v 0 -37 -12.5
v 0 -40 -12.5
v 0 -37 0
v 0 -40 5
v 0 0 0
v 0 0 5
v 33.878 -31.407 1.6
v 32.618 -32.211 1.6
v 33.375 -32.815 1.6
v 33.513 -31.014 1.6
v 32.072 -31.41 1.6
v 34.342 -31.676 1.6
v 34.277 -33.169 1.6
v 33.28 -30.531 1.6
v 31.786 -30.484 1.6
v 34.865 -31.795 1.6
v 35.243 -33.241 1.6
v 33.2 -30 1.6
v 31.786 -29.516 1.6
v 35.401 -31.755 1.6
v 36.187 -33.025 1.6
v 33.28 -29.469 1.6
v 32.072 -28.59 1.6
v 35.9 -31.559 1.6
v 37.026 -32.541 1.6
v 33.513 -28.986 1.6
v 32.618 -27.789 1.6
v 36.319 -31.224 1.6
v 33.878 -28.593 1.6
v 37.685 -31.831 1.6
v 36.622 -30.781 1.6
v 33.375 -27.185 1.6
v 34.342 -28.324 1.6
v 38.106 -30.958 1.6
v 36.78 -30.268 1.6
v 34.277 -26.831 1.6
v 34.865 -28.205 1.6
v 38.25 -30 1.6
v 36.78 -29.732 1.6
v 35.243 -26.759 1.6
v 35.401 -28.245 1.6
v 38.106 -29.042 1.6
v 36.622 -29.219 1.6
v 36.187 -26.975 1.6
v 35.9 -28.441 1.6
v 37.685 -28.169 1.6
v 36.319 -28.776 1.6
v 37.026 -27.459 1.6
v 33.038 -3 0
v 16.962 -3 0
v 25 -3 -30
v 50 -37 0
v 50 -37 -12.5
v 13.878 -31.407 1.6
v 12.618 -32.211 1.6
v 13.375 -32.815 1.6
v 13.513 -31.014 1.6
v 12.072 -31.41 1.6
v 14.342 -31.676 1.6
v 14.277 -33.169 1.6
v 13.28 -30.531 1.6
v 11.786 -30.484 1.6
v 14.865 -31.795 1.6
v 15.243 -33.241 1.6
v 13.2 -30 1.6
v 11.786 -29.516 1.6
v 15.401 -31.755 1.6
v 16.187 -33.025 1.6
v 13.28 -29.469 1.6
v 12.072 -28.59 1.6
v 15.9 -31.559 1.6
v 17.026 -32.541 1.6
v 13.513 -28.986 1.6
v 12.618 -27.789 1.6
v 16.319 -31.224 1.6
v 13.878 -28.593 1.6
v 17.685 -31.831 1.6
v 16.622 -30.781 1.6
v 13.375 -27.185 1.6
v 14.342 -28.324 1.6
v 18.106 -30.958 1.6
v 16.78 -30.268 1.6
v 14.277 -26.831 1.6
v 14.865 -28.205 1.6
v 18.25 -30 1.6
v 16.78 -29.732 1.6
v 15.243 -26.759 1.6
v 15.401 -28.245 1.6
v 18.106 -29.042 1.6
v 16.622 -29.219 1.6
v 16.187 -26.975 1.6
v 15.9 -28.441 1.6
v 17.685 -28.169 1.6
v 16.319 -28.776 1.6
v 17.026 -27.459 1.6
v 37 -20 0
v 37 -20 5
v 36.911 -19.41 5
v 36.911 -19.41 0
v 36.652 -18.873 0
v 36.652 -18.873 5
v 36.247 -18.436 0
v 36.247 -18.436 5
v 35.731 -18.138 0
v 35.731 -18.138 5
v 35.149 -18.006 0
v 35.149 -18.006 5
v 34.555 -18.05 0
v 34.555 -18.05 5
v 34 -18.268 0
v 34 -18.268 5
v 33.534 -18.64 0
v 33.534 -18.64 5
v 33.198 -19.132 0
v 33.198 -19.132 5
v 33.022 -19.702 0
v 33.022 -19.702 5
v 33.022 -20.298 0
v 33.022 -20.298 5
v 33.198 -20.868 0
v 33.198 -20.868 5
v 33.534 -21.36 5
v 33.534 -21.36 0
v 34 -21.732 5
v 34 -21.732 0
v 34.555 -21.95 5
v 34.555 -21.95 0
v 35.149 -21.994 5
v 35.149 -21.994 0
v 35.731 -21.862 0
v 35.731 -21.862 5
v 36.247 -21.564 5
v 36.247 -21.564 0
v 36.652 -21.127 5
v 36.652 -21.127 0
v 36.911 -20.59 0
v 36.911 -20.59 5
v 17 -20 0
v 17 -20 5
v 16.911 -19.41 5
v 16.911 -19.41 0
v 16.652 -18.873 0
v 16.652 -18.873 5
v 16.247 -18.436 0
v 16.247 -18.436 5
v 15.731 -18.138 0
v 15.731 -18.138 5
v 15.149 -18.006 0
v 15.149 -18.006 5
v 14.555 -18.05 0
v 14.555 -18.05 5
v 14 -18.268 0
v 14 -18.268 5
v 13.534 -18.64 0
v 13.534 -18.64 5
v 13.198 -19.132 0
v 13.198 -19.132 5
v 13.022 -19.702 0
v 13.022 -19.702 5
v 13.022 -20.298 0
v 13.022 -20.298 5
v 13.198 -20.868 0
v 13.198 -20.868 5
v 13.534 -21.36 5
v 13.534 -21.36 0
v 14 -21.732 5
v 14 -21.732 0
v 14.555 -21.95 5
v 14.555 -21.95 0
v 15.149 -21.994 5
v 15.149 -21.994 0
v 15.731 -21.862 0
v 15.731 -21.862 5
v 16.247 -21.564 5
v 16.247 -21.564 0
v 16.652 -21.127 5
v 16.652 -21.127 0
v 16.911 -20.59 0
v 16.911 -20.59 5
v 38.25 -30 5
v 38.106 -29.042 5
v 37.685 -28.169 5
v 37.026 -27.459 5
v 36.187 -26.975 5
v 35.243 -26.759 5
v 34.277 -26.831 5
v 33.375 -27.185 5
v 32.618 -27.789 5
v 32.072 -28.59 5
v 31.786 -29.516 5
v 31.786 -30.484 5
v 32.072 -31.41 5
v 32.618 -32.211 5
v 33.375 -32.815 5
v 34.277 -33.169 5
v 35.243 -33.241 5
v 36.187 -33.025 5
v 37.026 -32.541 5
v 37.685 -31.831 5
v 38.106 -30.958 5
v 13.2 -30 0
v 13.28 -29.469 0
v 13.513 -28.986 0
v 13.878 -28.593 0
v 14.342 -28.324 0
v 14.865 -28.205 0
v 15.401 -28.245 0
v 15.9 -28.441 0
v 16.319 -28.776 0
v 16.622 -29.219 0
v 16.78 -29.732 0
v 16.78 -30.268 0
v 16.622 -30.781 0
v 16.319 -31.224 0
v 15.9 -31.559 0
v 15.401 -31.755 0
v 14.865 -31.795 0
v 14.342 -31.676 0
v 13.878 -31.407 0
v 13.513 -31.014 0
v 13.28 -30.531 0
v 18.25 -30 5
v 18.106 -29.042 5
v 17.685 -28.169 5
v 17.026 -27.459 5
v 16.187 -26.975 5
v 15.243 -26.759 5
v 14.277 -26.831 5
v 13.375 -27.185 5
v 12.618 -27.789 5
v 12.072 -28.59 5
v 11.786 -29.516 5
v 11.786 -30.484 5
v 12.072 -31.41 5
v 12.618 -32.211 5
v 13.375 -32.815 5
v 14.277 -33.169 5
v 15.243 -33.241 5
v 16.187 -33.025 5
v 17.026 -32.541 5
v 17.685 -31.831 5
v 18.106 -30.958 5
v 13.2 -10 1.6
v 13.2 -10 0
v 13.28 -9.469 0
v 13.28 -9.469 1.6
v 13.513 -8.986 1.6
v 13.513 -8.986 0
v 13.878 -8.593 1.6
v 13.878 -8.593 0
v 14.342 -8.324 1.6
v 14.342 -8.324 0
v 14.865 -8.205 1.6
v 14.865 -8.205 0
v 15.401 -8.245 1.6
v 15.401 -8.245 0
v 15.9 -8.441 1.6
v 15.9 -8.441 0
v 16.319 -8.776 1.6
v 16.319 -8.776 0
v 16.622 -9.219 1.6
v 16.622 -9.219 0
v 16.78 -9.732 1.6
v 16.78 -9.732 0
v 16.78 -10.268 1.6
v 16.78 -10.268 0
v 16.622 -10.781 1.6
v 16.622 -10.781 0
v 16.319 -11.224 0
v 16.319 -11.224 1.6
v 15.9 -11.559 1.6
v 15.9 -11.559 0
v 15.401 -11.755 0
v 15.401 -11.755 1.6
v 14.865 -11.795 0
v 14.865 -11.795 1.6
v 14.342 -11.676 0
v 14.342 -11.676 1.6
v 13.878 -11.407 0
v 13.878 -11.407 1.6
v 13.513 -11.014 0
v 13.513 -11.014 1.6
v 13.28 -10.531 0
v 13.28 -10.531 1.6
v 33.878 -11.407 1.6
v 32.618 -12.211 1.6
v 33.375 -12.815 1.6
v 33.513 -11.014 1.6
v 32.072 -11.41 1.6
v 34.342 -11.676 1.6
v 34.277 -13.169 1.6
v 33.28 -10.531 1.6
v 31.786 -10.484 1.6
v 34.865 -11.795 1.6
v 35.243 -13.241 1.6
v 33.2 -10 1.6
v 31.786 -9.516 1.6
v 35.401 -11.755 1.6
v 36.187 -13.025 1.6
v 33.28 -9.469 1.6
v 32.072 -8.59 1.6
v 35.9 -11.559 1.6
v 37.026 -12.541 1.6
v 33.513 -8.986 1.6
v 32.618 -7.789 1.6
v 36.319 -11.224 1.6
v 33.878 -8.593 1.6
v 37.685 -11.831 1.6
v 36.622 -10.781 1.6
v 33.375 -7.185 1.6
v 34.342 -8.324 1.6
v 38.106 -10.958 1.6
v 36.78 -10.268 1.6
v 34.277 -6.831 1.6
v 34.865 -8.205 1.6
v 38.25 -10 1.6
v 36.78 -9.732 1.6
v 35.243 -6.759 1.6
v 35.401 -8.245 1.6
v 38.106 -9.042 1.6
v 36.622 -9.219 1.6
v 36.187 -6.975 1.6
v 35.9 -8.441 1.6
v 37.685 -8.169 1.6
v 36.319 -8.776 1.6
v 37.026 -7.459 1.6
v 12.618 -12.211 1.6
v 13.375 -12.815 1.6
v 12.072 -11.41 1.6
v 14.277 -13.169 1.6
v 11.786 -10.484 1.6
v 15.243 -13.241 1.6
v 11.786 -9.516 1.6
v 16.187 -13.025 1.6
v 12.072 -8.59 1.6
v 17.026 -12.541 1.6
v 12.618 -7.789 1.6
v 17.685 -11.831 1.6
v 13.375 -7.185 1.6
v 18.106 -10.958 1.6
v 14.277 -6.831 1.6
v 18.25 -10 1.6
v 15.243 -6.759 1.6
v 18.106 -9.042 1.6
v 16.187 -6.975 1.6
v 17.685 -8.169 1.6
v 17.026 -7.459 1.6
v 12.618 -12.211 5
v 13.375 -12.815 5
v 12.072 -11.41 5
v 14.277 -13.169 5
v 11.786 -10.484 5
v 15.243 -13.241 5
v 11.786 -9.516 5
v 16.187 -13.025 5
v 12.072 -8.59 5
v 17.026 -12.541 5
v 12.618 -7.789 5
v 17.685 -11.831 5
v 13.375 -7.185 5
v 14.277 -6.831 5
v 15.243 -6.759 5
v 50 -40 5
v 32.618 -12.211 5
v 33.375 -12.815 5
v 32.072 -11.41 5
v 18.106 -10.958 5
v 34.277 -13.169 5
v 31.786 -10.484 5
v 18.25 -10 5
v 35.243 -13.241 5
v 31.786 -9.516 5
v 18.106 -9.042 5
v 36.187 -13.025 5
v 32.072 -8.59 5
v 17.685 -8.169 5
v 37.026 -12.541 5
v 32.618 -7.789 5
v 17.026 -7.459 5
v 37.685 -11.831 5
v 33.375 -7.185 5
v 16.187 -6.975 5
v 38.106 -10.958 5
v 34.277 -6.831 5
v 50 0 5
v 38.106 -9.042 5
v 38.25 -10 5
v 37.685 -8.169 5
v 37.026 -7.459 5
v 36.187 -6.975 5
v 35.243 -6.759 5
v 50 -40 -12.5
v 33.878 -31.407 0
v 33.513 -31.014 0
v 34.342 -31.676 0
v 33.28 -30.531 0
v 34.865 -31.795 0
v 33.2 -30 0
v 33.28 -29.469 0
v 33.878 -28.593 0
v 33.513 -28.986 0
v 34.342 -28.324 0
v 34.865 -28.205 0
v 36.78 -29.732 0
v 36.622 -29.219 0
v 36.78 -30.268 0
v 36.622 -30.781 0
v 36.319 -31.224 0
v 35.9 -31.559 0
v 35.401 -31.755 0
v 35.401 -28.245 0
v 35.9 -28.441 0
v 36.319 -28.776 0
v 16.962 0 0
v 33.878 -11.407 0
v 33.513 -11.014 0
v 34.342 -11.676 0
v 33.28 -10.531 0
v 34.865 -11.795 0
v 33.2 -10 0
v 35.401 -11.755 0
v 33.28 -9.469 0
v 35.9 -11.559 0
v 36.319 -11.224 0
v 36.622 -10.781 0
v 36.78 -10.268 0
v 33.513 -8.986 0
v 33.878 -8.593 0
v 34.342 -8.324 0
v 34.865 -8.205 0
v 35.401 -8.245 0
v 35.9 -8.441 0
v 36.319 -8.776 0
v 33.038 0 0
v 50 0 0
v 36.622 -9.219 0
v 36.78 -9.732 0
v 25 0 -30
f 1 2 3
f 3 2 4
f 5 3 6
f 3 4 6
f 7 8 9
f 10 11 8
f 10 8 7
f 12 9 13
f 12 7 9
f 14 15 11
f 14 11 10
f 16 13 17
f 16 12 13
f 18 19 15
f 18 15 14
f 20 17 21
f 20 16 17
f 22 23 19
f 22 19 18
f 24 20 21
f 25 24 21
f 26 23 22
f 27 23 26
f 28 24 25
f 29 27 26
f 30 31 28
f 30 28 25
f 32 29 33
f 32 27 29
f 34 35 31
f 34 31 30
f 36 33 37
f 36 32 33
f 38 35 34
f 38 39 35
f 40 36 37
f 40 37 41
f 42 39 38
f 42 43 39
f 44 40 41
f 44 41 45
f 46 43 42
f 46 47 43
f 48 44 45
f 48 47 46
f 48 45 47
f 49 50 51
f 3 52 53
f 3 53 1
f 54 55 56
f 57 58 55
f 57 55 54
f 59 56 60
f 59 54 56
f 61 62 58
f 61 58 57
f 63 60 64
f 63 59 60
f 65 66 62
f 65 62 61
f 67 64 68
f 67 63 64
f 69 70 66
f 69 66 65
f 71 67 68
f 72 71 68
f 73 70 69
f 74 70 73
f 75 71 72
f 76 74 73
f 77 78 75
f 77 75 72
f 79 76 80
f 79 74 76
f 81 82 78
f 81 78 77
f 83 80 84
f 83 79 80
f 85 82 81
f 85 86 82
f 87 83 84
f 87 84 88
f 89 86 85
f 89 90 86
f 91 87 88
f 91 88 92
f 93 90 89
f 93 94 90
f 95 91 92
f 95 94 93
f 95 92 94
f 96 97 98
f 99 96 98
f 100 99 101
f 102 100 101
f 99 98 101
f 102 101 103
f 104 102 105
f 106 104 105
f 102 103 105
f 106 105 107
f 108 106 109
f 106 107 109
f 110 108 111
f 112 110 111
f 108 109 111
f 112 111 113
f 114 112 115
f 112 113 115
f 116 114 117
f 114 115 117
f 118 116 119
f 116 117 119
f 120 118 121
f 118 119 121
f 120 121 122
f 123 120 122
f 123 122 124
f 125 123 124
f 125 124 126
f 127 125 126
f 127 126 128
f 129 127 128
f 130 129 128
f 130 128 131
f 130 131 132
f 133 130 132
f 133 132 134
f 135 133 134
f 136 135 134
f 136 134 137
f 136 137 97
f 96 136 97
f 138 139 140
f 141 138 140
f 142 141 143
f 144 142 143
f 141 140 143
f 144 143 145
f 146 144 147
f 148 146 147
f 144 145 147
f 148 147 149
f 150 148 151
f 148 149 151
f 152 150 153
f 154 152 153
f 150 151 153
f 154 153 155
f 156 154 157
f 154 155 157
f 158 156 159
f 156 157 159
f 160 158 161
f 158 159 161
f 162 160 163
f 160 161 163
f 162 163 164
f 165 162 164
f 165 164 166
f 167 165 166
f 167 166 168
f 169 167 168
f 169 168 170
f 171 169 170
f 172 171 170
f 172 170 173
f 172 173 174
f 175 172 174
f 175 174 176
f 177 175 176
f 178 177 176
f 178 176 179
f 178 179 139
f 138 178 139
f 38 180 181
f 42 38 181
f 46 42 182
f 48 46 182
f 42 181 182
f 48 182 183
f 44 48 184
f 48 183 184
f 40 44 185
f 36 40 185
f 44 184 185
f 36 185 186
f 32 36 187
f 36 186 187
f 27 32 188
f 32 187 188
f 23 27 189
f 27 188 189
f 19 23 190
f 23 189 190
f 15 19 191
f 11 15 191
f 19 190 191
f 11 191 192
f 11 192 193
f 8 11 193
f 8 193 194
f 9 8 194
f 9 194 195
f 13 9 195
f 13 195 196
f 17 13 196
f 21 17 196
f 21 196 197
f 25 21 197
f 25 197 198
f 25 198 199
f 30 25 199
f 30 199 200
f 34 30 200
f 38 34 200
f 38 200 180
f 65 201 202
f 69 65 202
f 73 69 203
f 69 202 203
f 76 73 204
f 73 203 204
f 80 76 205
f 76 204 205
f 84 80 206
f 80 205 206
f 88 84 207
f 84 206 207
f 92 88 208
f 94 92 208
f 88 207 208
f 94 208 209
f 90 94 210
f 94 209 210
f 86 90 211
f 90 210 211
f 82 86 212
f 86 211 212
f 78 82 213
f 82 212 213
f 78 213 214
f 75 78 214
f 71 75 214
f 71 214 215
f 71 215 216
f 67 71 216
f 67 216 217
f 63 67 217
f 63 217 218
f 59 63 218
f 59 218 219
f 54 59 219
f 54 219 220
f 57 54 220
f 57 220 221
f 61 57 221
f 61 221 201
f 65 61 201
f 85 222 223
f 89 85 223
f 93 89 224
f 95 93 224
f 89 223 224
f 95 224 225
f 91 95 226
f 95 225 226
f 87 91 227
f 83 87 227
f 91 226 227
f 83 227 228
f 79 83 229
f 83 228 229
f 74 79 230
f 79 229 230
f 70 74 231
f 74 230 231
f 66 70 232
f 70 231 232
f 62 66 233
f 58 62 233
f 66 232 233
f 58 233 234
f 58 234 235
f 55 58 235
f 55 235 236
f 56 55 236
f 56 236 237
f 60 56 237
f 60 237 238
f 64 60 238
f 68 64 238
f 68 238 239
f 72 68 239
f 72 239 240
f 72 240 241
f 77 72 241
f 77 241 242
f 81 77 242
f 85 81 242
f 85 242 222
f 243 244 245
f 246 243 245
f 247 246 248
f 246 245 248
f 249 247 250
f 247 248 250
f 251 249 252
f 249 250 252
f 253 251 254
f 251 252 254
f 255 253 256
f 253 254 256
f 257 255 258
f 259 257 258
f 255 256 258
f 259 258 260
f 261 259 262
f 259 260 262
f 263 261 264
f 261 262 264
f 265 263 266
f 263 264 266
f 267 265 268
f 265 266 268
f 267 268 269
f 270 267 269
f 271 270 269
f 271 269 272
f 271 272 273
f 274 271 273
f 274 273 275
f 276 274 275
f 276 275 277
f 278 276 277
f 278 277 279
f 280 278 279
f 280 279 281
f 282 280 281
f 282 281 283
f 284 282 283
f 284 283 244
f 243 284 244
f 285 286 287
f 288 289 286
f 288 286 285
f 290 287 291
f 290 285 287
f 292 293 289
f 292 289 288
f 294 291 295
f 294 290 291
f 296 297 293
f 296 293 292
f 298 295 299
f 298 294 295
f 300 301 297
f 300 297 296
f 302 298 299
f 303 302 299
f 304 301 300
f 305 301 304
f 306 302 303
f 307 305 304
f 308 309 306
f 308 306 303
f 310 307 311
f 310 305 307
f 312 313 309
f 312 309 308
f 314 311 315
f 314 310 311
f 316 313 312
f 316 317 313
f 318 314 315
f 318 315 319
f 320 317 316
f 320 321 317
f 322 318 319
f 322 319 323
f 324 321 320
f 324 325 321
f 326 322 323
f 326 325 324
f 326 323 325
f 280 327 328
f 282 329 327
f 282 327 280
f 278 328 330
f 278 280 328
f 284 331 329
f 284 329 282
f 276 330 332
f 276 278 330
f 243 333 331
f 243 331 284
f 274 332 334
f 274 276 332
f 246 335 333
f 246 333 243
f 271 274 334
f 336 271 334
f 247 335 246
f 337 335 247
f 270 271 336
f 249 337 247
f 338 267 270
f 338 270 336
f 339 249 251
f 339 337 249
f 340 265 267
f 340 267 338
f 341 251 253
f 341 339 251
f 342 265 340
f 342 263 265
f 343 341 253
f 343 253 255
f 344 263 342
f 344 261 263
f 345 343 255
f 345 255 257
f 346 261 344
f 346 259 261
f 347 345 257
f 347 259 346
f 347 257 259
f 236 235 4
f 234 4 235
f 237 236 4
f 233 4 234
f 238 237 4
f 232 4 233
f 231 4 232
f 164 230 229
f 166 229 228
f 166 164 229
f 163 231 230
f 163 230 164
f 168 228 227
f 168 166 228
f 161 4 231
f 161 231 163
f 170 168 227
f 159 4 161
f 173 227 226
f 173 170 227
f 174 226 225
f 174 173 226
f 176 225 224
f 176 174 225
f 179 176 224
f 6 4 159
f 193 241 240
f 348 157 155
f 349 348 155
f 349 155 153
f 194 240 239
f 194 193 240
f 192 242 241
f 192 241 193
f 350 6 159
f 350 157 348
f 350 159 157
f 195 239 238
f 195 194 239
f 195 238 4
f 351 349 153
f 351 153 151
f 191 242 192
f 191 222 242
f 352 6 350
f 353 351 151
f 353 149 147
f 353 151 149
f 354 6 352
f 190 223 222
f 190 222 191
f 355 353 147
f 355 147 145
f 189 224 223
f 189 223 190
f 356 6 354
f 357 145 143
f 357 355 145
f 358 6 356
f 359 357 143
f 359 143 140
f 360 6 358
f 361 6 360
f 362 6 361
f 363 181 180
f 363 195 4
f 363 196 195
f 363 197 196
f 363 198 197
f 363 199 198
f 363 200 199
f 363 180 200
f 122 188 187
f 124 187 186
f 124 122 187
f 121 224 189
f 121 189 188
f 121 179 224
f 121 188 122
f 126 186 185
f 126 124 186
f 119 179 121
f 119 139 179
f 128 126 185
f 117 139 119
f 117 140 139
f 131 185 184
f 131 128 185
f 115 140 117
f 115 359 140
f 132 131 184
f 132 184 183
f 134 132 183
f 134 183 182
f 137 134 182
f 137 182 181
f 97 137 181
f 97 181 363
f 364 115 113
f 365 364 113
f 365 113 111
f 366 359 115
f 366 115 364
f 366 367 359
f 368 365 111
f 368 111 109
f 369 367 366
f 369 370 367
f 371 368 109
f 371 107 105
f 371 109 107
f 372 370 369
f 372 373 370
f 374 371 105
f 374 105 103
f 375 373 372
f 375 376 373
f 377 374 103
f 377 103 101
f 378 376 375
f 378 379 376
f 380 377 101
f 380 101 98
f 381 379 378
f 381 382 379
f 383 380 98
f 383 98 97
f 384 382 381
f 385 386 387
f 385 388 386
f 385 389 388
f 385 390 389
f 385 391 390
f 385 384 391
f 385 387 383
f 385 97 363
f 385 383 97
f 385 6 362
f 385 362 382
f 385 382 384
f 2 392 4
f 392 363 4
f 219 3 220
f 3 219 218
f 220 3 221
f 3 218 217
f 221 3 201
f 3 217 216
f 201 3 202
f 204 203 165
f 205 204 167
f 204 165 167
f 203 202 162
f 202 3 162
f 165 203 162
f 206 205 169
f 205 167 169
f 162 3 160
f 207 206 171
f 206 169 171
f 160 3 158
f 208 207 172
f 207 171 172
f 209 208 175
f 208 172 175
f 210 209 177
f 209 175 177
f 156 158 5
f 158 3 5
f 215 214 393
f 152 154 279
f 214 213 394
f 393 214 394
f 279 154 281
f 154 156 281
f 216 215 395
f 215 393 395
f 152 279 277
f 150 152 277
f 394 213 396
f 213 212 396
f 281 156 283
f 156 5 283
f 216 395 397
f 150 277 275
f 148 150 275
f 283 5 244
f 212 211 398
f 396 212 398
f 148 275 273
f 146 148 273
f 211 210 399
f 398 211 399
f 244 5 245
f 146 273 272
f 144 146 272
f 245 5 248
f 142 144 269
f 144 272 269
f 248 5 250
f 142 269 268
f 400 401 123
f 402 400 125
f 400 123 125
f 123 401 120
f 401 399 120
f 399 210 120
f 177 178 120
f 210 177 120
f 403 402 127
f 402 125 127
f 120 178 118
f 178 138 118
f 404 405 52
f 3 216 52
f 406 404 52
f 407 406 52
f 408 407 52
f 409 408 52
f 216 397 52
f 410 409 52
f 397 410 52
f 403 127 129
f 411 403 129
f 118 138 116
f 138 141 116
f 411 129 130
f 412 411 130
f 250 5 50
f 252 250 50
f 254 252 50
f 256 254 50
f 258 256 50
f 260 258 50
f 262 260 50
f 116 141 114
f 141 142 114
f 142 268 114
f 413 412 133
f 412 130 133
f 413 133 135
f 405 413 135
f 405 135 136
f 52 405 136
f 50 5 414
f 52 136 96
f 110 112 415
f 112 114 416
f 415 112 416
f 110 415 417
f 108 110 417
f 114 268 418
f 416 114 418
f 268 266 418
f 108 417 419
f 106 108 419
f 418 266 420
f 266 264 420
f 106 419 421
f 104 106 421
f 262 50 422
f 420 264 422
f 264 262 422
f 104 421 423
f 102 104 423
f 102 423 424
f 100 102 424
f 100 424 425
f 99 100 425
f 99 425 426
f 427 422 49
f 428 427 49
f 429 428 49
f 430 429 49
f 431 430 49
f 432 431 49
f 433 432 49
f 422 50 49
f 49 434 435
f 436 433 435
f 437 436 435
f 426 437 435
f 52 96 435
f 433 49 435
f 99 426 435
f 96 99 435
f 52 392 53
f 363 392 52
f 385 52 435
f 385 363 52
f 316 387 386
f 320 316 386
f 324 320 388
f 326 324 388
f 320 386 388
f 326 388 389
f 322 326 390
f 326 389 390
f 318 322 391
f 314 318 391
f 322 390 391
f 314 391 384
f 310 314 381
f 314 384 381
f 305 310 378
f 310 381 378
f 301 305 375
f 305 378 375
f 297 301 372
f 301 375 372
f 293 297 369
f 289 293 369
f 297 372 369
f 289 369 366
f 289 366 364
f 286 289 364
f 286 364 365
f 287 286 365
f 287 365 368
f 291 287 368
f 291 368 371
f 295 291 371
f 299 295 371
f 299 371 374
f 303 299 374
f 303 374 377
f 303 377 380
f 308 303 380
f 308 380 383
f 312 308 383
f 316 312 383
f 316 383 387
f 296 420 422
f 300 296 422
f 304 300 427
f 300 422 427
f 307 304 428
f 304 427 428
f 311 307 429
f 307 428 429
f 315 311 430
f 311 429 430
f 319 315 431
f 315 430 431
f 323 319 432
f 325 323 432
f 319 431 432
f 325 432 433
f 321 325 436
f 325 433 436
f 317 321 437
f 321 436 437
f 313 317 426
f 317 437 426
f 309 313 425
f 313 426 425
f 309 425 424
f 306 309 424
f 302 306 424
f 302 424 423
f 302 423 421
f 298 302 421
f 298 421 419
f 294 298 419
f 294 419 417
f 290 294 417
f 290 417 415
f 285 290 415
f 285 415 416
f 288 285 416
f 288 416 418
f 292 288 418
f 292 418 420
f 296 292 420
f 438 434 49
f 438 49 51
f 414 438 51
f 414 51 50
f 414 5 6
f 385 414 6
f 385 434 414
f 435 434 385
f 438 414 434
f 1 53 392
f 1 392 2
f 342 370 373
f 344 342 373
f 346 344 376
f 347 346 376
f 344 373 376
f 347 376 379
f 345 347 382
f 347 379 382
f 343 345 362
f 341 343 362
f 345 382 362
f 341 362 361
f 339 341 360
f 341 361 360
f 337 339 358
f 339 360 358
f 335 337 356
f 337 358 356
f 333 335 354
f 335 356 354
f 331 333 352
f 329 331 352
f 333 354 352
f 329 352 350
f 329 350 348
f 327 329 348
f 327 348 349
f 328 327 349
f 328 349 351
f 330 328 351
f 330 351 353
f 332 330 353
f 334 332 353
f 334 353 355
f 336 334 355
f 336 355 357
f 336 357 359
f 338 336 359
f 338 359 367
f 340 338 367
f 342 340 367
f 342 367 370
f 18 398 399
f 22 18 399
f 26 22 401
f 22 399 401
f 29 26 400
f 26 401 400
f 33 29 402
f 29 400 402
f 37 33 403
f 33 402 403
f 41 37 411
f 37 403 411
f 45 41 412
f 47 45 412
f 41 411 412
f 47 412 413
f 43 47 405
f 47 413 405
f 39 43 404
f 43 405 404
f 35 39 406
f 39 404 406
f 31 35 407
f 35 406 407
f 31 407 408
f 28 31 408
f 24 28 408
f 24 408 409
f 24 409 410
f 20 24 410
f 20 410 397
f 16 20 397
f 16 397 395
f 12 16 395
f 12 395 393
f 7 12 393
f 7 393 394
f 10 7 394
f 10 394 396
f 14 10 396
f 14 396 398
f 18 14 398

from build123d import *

# Parameters (mm, degrees)
SKIZZE1_W                                            = 50
SKIZZE1_H                                            = 40
AUFSATZ_LINEAR_AUSTRAGEN1_DEPTH                      = 5
AUFSATZ_LINEAR_AUSTRAGEN2_DEPTH                      = 3
STIRNSENKUNG_F_R_M3_ZYLINDERSCHRAUBE_MIT_D           = 3.6
STIRNSENKUNG_F_R_M3_ZYLINDERSCHRAUBE_MIT_DEPTH       = 5
STIRNSENKUNG_F_R_M3_ZYLINDERSCHRAUBE_MIT_CBORE_D     = 6.5
STIRNSENKUNG_F_R_M3_ZYLINDERSCHRAUBE_MIT_CBORE_DEPTH = 3.4
SKIZZE6_R                                            = 2
SCHNITT_LINEAR_AUSTRAGEN1_DEPTH                      = 36
SKIZZE7_W                                            = 50
SKIZZE7_H                                            = 3
AUFSATZ_LINEAR_AUSTRAGEN3_DEPTH                      = 12.5


with BuildPart() as part:
    # Skizze1 → Aufsatz-Linear austragen1 (new body)
    with BuildSketch(Plane.XY):
        with Locations((25, -20)):
            Rectangle(SKIZZE1_W, SKIZZE1_H)
    extrude(amount=AUFSATZ_LINEAR_AUSTRAGEN1_DEPTH)

    # Skizze2 → Aufsatz-Linear austragen2 (add)
    with BuildSketch(Plane(origin=(0, 0, 0), x_dir=(1, 0, 0), z_dir=(0, 1, 0))):
        Polygon((25, 30), (16.961524227, 0), (33.038475773, 0), align=None)
    extrude(amount=-AUFSATZ_LINEAR_AUSTRAGEN2_DEPTH)

    # Stirnsenkung für M3 Zylinderschraube mit Innensechskant1
    with Locations(Plane.XY.offset(5)):
        with Locations((15, -10), (35, -10), (35, -30), (15, -30)):
            CounterBoreHole(STIRNSENKUNG_F_R_M3_ZYLINDERSCHRAUBE_MIT_D / 2, STIRNSENKUNG_F_R_M3_ZYLINDERSCHRAUBE_MIT_CBORE_D / 2, STIRNSENKUNG_F_R_M3_ZYLINDERSCHRAUBE_MIT_CBORE_DEPTH, depth=STIRNSENKUNG_F_R_M3_ZYLINDERSCHRAUBE_MIT_DEPTH)

    # Skizze6 → Schnitt-Linear austragen1 (cut, through all)
    with BuildSketch(Plane.XY.offset(5)):
        with Locations((15, -20)):
            Circle(SKIZZE6_R)
        with Locations((35, -20)):
            Circle(SKIZZE6_R)
    extrude(amount=-SCHNITT_LINEAR_AUSTRAGEN1_DEPTH, mode=Mode.SUBTRACT)

    # Skizze7 → Aufsatz-Linear austragen3 (add)
    with BuildSketch(Plane(origin=(0, 0, 0), x_dir=(-1, 0, 0), z_dir=(0, 0, -1))):
        with Locations((-25, -38.5)):
            Rectangle(SKIZZE7_W, SKIZZE7_H)
    extrude(amount=AUFSATZ_LINEAR_AUSTRAGEN3_DEPTH)


solid = part.part
